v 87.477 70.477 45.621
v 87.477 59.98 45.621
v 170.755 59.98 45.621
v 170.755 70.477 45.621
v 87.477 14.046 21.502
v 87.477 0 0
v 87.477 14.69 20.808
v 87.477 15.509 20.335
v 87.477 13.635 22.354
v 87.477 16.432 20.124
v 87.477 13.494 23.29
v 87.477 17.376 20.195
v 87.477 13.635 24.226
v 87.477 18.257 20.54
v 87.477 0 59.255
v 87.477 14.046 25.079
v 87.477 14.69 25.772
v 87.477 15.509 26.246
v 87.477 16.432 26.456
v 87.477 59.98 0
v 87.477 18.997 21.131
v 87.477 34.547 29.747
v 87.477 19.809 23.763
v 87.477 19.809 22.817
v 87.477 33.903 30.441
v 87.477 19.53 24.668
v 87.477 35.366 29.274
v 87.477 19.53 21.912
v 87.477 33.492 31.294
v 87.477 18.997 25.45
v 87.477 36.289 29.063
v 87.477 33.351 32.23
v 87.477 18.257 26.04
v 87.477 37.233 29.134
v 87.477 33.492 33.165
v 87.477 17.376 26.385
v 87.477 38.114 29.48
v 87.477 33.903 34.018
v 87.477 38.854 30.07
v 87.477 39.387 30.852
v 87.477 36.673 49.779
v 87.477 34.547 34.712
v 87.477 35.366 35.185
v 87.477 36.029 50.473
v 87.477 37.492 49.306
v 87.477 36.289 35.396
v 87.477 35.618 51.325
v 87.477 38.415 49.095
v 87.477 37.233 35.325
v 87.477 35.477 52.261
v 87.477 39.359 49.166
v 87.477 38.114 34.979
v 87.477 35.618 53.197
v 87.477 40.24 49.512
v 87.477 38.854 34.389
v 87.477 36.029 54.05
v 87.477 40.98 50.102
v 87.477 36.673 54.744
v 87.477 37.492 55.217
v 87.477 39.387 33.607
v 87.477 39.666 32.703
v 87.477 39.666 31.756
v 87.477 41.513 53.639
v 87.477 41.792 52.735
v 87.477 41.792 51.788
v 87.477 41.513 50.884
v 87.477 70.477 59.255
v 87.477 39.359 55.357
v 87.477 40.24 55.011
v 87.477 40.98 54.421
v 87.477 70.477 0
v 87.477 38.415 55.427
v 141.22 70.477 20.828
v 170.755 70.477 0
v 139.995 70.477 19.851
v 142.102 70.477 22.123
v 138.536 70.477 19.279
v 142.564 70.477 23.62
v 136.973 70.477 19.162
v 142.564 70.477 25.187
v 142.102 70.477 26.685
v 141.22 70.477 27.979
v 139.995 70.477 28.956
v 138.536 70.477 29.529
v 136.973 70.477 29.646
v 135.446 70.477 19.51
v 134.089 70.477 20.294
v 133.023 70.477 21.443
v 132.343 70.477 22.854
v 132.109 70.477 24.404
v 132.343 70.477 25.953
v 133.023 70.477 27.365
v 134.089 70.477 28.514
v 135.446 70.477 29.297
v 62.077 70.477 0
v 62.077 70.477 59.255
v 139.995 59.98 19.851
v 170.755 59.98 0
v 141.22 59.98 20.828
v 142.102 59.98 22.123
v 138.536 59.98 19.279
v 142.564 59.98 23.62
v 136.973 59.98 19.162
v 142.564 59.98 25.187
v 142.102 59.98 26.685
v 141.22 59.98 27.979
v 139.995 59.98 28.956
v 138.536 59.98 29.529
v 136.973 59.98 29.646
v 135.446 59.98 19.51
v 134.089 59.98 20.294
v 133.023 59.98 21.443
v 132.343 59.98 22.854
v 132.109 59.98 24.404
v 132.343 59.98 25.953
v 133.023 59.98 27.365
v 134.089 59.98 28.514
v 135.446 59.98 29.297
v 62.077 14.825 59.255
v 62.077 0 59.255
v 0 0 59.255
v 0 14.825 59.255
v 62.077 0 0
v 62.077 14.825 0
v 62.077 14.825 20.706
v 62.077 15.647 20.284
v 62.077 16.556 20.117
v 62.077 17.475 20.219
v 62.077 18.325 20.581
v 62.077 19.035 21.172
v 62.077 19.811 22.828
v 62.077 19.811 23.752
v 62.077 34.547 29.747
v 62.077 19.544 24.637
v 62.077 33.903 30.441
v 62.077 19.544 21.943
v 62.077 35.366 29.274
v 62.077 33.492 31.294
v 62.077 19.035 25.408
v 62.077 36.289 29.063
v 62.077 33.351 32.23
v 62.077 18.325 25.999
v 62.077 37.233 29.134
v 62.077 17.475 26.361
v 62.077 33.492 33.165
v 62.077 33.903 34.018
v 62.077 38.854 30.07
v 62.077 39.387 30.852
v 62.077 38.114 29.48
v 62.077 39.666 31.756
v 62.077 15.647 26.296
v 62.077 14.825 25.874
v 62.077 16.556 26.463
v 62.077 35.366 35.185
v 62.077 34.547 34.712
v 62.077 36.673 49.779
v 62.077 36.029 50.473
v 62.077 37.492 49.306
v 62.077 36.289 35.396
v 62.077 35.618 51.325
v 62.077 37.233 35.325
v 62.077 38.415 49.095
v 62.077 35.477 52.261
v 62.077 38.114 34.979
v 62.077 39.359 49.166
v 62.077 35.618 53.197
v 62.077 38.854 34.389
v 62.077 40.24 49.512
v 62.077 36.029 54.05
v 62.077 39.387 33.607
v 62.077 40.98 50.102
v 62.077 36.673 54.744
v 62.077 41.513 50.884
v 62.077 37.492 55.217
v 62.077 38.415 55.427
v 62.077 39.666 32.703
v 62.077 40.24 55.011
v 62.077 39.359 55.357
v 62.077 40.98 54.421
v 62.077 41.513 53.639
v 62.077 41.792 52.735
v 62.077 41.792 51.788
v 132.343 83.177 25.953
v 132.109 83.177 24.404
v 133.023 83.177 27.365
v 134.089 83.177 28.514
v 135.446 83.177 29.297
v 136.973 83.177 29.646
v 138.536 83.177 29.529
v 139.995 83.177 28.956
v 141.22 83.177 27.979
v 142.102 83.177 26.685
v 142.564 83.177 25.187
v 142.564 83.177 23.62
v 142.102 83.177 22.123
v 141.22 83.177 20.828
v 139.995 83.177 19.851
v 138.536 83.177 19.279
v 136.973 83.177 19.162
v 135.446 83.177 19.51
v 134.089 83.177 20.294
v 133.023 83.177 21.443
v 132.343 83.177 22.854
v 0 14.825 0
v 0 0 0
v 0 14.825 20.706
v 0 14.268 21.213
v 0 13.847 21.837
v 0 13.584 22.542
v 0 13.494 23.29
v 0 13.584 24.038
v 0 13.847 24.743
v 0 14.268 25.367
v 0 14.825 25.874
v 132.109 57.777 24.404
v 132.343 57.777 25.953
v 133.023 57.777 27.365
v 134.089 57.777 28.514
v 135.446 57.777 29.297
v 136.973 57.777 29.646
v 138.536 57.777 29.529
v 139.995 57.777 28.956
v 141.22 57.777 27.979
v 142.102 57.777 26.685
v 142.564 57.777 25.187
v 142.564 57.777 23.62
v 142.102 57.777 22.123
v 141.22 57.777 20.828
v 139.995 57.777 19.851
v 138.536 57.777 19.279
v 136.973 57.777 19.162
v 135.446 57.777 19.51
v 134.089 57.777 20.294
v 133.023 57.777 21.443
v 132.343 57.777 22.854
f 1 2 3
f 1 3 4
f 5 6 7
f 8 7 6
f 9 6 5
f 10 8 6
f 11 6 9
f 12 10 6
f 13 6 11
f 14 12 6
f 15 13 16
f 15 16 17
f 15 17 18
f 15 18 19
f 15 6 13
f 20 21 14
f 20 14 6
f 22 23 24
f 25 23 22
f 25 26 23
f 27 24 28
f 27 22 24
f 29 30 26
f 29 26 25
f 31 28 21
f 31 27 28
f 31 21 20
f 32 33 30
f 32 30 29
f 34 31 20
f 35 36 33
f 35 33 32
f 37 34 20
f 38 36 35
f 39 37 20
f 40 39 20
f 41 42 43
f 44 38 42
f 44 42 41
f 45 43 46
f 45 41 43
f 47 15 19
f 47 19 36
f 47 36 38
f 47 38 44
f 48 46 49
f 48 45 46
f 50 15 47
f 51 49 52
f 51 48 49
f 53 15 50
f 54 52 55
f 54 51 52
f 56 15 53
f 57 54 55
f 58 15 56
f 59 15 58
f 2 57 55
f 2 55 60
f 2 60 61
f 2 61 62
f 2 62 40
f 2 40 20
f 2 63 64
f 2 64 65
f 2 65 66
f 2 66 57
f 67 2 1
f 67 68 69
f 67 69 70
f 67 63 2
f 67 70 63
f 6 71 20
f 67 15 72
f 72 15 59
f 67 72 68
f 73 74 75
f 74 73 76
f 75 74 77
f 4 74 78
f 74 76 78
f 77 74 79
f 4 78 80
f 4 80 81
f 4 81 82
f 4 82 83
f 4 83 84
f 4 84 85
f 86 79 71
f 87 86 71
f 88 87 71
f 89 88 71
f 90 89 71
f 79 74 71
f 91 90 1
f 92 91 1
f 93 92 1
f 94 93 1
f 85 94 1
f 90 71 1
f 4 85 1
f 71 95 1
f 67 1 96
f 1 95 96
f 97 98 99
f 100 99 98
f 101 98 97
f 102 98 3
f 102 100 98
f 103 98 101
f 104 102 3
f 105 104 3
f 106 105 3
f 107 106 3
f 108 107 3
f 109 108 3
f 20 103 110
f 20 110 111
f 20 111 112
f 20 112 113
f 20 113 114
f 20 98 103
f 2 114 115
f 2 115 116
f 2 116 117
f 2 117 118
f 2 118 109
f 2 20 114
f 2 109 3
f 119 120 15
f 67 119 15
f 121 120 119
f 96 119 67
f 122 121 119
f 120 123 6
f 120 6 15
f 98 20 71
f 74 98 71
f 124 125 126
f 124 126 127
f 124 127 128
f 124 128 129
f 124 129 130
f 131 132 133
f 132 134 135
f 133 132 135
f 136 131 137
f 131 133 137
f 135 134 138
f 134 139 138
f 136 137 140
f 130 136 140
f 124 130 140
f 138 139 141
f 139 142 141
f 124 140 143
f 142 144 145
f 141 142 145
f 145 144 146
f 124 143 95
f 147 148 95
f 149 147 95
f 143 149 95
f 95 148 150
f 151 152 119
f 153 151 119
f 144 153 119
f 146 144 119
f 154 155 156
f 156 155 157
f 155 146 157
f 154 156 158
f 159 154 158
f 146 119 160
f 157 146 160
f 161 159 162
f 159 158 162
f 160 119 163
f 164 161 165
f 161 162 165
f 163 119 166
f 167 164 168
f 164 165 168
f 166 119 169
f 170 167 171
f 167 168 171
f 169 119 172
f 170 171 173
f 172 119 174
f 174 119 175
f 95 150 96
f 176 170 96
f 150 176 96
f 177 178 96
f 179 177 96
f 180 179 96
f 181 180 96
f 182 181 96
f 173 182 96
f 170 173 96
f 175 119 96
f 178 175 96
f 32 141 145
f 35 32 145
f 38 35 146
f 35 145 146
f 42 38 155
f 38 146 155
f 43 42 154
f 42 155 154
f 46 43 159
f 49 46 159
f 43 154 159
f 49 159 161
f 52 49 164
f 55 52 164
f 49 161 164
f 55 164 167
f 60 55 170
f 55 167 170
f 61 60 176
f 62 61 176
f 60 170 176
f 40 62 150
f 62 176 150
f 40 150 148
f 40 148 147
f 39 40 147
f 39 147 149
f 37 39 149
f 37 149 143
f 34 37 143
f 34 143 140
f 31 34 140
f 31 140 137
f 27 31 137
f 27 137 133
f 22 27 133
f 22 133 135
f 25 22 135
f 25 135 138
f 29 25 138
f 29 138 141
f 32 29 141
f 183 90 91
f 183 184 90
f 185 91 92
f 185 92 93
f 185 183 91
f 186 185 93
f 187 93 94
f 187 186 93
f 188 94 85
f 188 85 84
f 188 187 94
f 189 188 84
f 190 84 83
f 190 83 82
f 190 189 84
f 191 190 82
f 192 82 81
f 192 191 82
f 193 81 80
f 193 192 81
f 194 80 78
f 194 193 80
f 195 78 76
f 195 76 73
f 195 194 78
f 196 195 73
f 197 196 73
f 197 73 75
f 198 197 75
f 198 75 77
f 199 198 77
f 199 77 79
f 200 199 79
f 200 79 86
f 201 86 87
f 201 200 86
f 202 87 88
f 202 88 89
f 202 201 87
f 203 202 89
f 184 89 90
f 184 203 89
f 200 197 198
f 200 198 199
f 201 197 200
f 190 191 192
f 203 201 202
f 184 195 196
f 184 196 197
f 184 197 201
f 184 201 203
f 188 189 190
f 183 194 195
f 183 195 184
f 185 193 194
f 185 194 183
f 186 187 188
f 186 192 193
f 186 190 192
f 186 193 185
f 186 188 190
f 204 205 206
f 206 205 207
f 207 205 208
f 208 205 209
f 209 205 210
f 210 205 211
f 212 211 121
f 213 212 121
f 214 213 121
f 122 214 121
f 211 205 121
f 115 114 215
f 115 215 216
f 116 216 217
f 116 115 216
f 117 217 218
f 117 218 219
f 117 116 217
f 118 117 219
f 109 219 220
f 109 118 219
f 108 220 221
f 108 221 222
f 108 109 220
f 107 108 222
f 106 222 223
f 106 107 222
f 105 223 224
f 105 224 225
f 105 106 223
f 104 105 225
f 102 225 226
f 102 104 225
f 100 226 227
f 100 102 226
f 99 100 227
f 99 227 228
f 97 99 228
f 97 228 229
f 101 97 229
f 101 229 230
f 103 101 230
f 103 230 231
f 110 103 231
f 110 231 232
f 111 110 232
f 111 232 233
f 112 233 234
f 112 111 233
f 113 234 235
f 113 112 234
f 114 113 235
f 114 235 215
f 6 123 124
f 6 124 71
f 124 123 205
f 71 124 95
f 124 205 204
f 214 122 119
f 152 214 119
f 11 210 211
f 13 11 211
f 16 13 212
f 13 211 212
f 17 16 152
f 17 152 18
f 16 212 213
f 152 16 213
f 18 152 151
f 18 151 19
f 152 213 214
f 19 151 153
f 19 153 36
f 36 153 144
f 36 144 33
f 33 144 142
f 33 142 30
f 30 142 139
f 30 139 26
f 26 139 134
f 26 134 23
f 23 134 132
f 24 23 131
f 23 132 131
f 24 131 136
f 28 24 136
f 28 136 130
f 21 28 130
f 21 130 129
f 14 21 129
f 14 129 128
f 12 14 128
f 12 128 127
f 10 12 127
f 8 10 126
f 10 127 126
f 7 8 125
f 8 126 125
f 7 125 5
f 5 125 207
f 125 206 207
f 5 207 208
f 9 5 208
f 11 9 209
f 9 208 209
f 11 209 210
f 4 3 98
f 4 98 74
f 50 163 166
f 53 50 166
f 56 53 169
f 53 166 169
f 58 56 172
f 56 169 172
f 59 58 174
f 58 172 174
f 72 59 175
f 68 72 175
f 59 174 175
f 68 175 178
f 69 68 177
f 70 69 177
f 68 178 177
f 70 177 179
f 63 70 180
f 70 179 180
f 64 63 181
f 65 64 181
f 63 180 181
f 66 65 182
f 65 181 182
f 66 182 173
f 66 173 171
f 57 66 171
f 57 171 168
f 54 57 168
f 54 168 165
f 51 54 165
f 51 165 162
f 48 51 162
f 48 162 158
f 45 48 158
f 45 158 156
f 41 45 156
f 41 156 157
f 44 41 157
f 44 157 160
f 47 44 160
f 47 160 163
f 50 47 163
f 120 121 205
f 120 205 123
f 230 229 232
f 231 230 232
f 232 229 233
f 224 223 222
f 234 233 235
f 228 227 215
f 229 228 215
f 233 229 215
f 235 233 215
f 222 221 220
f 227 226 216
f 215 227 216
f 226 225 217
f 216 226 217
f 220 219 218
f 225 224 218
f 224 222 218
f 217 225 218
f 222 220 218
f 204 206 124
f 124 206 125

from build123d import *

# Parameters (mm, degrees)
F0_W     = 62.077142
F0_H     = 59.255235
F1_DEPTH = 14.824914
F2_W     = 70.476621
F2_H     = 59.255235
F3_DEPTH = 25.4
F4_W     = 10.496232
F4_H     = 45.620956
F5_DEPTH = 83.277501
F6_R     = 5.256792
F7_DEPTH = 12.7
F9_D     = 6.35


with BuildPart() as f1:
    # F0 (on Front) → F1 (new body)
    with BuildSketch(Plane.XZ):
        with Locations((31.038571, 29.627617)):
            Rectangle(F0_W, F0_H)
    extrude(amount=-F1_DEPTH)

    # F2 (on face) → F3 (join)
    with BuildSketch(Plane.YZ.offset(62.077142)):
        with Locations((35.23831, 29.627617)):
            Rectangle(F2_W, F2_H)
    extrude(amount=F3_DEPTH)

    # F4 (on face) → F5 (join)
    with BuildSketch(Plane.YZ.offset(87.477142)):
        with Locations((65.228505, 22.810478)):
            Rectangle(F4_W, F4_H)
    extrude(amount=F5_DEPTH)

    # F6 (on face) → F7 (join, symmetric)
    with BuildSketch(Plane(origin=(0, 70.476621, 0), x_dir=(-1, 0, 0), z_dir=(0, 1, 0))):
        with Locations((-137.36628, 24.403818)):
            Circle(F6_R)
    extrude(amount=F7_DEPTH, both=True)

    # F9 (through all)
    with Locations(Plane.YZ.offset(87.477142)):
        with Locations((16.669355, 23.290077), (36.526144, 32.229573), (38.65239, 52.261315)):
            Hole(F9_D / 2)


solid = f1.part
